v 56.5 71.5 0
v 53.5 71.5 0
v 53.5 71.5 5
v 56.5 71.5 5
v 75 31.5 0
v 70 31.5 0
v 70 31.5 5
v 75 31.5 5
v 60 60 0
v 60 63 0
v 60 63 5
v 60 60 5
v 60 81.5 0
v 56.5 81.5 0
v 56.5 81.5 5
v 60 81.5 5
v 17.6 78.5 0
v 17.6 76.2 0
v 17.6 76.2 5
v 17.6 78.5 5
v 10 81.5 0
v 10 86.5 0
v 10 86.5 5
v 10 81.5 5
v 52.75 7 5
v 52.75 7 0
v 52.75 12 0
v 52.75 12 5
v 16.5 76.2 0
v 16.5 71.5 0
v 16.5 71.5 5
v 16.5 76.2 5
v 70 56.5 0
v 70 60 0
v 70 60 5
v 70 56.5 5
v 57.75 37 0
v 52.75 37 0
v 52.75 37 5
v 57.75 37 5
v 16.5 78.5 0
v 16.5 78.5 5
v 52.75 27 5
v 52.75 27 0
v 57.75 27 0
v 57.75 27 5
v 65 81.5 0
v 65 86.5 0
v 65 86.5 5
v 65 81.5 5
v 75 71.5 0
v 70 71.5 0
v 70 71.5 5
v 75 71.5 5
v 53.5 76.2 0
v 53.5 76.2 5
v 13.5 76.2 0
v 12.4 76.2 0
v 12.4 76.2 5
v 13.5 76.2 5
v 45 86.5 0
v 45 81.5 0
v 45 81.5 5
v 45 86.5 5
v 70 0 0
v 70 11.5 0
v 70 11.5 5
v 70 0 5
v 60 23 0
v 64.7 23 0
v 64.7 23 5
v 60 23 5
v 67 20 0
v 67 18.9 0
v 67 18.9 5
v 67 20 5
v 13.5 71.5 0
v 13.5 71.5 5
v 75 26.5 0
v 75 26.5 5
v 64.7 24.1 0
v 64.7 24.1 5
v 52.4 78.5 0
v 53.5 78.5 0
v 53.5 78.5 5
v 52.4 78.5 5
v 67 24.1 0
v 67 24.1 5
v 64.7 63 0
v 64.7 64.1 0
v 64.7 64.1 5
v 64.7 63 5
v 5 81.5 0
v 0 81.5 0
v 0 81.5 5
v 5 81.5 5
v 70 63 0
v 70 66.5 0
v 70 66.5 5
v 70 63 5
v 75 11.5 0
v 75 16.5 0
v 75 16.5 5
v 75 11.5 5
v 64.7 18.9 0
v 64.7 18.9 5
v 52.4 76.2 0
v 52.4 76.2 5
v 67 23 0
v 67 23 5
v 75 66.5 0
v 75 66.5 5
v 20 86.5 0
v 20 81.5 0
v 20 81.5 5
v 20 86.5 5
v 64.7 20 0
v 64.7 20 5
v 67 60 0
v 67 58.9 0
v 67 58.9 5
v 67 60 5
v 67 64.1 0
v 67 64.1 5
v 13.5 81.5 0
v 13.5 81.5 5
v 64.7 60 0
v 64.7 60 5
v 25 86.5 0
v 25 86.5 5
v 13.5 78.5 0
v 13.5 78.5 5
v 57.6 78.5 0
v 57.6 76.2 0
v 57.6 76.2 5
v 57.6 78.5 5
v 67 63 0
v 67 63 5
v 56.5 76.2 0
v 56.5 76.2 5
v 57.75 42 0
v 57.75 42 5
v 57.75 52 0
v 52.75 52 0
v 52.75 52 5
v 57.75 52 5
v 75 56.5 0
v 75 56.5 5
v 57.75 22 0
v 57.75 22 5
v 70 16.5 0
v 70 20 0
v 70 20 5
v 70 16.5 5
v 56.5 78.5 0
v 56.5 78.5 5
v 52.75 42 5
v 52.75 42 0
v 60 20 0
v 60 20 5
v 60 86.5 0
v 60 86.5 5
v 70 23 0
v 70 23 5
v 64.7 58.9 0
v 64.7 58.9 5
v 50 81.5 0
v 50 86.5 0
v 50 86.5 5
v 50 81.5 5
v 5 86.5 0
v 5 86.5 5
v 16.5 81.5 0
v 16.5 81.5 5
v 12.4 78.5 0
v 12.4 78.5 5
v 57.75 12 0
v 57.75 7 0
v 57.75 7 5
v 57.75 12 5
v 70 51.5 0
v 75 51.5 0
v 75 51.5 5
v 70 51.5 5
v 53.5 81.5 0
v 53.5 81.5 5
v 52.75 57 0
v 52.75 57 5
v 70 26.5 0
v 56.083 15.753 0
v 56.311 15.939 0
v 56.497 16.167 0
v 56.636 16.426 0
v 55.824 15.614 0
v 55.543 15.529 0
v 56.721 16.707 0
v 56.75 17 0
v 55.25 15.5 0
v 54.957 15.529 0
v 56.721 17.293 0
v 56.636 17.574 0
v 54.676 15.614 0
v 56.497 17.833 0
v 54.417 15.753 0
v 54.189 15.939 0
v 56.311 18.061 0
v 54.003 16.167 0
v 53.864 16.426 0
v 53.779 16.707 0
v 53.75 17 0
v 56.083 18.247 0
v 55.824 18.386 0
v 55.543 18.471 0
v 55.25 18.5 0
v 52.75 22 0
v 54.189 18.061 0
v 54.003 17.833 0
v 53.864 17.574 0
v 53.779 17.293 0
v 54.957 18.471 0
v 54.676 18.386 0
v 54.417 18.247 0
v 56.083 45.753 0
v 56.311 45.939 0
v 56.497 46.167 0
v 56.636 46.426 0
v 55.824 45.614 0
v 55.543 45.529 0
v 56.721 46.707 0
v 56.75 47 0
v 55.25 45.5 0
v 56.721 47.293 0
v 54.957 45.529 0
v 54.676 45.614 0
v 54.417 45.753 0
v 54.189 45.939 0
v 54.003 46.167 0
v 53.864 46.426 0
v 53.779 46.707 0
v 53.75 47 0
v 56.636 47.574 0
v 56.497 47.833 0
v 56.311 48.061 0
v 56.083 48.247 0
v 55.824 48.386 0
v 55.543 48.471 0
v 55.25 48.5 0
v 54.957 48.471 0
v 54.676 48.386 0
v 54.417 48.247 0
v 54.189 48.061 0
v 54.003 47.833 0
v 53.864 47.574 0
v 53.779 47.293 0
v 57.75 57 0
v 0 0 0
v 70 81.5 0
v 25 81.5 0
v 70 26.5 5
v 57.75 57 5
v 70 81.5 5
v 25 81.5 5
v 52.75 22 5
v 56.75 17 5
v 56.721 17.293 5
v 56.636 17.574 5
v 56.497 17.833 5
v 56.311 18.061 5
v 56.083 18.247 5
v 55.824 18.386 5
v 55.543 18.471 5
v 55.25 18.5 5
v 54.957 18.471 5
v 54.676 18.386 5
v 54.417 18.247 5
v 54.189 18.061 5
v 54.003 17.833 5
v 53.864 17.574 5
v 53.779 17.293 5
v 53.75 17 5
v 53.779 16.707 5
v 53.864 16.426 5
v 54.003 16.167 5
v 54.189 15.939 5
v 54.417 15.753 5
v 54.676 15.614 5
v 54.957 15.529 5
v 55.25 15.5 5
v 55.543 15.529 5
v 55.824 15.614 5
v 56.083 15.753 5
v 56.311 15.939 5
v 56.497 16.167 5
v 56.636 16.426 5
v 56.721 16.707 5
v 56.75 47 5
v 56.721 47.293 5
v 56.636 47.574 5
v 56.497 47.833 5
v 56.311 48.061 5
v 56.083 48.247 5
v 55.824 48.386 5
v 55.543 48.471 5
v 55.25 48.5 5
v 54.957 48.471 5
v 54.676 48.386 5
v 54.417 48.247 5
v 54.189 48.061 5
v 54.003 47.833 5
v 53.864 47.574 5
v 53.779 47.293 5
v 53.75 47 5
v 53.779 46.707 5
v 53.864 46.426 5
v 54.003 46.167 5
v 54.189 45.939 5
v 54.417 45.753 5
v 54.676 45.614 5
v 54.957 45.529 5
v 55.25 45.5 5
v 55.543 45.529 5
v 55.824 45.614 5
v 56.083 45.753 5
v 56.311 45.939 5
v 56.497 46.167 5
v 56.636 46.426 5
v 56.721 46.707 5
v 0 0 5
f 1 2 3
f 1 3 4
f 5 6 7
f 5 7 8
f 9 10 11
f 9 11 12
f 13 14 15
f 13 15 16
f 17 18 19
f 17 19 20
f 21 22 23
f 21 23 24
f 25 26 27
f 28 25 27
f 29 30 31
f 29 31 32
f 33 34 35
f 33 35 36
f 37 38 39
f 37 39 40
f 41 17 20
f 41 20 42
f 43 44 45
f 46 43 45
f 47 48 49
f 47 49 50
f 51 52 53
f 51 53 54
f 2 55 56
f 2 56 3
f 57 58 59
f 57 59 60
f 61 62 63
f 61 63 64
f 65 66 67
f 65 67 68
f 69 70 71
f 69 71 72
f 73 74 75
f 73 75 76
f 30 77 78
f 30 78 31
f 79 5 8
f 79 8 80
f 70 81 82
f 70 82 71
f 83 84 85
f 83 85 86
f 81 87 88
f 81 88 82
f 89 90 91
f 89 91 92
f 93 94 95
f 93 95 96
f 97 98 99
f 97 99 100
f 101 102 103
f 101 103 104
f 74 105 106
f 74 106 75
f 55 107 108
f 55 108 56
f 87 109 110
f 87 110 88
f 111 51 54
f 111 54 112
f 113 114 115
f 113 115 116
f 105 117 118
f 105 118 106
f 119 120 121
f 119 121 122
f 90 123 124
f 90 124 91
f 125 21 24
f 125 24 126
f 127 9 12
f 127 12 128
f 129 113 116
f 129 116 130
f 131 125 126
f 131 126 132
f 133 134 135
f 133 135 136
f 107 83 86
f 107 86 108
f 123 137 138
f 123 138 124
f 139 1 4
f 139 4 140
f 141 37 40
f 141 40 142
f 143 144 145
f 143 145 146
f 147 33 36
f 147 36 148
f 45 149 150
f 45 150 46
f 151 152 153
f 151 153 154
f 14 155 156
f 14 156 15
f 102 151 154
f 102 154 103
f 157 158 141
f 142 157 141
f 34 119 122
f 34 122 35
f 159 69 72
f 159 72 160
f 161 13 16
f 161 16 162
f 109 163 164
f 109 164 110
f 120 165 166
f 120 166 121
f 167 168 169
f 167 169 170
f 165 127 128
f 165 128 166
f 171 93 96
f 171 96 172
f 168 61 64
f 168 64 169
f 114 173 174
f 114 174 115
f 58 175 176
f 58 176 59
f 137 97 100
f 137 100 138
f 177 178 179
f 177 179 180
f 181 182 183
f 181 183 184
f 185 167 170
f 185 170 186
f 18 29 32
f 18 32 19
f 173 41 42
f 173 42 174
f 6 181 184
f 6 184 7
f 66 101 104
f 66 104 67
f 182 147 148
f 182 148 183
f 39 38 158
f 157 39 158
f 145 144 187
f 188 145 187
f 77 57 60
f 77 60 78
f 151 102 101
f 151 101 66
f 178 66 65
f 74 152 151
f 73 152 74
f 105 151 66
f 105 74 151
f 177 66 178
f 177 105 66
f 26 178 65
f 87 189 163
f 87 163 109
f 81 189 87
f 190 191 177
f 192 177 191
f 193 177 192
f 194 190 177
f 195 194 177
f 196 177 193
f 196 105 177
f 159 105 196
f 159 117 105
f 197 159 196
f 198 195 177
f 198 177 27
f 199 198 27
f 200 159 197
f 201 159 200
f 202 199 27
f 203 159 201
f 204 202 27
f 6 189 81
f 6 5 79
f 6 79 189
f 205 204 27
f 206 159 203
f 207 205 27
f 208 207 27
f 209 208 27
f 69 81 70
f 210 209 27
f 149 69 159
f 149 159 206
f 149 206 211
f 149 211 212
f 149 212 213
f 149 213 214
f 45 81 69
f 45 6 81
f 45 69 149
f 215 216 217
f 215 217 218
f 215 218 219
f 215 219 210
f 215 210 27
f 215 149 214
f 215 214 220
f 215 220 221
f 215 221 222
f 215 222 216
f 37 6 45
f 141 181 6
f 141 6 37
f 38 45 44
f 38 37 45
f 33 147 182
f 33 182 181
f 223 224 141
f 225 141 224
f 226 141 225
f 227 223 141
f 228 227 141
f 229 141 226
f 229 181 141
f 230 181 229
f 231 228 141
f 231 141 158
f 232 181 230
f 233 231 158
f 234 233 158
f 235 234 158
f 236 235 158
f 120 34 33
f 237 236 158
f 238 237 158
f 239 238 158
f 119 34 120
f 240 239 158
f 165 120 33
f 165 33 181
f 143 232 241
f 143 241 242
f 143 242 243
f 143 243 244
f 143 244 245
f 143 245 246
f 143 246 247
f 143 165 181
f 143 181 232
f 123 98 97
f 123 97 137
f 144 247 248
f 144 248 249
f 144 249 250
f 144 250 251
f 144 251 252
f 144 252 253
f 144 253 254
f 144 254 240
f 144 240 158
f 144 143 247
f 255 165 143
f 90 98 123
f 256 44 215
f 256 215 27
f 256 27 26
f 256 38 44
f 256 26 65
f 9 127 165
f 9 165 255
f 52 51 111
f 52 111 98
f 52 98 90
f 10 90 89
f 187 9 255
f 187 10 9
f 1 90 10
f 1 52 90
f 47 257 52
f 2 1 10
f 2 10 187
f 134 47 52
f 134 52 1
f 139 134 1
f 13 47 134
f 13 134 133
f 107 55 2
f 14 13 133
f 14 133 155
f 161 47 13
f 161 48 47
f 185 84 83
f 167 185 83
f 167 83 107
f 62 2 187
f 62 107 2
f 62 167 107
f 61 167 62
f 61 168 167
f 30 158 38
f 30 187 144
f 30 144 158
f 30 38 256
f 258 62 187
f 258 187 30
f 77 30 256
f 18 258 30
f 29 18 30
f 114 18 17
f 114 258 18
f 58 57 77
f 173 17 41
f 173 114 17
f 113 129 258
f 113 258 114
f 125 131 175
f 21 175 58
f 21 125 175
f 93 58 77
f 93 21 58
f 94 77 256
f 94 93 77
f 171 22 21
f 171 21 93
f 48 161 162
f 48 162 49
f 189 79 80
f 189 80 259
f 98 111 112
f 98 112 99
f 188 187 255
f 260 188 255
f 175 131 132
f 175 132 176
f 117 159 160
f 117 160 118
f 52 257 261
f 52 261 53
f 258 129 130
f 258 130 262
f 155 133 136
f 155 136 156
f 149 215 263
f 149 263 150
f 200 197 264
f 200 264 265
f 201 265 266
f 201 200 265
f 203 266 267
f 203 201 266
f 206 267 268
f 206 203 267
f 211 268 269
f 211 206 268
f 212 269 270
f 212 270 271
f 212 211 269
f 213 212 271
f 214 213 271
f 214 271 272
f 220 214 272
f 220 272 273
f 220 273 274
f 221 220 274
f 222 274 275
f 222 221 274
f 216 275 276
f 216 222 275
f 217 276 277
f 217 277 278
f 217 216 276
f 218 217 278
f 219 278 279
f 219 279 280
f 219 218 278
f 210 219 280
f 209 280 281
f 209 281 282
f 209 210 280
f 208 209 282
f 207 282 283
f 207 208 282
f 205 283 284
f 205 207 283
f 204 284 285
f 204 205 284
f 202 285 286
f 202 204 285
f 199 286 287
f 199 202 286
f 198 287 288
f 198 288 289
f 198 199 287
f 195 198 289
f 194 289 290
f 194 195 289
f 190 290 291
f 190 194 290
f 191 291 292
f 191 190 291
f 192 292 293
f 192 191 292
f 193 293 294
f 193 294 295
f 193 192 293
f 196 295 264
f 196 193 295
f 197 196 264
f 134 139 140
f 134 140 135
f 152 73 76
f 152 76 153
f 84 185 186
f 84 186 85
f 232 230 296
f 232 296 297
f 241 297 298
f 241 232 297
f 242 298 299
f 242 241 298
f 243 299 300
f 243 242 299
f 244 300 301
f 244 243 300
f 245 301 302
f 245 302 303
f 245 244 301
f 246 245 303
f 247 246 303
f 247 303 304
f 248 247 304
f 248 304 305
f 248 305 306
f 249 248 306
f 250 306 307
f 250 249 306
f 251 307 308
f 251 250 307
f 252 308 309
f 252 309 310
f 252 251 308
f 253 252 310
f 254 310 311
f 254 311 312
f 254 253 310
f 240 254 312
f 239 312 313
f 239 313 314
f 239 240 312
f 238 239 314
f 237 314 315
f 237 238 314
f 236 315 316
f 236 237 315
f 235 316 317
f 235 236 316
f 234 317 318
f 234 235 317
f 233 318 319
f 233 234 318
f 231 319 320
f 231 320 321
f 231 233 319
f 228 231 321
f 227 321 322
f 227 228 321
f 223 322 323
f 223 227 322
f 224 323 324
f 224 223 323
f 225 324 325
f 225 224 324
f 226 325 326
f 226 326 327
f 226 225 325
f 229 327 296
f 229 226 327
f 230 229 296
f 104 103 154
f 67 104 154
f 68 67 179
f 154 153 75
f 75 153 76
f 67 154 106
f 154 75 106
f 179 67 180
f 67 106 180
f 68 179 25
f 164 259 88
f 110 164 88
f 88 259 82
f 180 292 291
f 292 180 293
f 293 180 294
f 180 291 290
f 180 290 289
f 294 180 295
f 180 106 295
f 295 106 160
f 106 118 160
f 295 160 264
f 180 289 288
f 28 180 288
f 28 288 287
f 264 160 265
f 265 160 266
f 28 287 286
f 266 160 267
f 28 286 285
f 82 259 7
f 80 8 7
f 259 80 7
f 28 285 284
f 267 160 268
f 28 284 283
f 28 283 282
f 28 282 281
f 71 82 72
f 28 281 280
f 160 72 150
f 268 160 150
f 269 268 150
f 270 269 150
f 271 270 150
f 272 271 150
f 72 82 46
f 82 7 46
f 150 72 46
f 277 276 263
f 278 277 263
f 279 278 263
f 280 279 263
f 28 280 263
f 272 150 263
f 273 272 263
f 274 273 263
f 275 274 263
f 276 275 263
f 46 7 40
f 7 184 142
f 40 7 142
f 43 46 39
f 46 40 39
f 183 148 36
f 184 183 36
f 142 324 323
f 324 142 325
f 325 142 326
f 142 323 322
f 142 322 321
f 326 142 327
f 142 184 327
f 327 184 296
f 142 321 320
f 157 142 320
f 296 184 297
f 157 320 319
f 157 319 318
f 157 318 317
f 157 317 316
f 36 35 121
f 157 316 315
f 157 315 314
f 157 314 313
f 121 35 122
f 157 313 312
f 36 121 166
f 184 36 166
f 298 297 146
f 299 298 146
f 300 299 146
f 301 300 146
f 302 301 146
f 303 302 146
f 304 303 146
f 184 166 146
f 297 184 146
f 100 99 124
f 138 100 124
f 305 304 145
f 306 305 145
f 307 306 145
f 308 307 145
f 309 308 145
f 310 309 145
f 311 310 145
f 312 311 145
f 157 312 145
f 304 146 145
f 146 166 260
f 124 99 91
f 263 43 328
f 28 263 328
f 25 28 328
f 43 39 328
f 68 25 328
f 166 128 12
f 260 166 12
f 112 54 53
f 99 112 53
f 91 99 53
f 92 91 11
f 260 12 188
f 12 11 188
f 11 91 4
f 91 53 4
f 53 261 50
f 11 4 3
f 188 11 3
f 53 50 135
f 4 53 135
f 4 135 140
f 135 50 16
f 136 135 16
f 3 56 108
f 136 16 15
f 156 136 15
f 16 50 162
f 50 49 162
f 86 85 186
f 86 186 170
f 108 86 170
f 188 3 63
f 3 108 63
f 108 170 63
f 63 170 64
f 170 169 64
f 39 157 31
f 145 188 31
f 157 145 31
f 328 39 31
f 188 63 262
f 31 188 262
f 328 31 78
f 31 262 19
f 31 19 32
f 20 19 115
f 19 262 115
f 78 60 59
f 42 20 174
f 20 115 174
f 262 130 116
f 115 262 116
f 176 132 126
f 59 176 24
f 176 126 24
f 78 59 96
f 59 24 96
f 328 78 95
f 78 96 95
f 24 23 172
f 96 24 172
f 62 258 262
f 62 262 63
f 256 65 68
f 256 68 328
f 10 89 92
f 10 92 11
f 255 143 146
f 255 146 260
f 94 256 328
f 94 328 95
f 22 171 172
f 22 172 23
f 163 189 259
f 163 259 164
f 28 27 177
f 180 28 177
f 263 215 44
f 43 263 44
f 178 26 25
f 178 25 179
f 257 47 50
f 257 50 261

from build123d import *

# Parameters (mm, degrees)
SKETCH1_R           = 1.5
SKETCH1_W           = 5
SKETCH1_H           = 5
BOSS_EXTRUDE1_DEPTH = 5


with BuildPart() as part:
    # Sketch1 → Boss-Extrude1 (new body)
    with BuildSketch(Plane.XY):
        Polygon((70, 81.5), (70, 71.5), (75, 71.5), (75, 66.5), (70, 66.5), (70, 63), (67, 63), (67, 64.1), (64.7, 64.1), (64.7, 63), (60, 63), (60, 60), (64.7, 60), (64.7, 58.9), (67, 58.9), (67, 60), (70, 60), (70, 56.5), (75, 56.5), (75, 51.5), (70, 51.5), (70, 31.5), (75, 31.5), (75, 26.5), (70, 26.5), (70, 23), (67, 23), (67, 24.1), (64.7, 24.1), (64.7, 23), (60, 23), (60, 20), (64.7, 20), (64.7, 18.9), (67, 18.9), (67, 20), (70, 20), (70, 16.5), (75, 16.5), (75, 11.5), (70, 11.5), (70, 0), (0, 0), (0, 81.5), (5, 81.5), (5, 86.5), (10, 86.5), (10, 81.5), (13.5, 81.5), (13.5, 78.5), (12.4, 78.5), (12.4, 76.2), (13.5, 76.2), (13.5, 71.5), (16.5, 71.5), (16.5, 76.2), (17.6, 76.2), (17.6, 78.5), (16.5, 78.5), (16.5, 81.5), (20, 81.5), (20, 86.5), (25, 86.5), (25, 81.5), (45, 81.5), (45, 86.5), (50, 86.5), (50, 81.5), (53.5, 81.5), (53.5, 78.5), (52.4, 78.5), (52.4, 76.2), (53.5, 76.2), (53.5, 71.5), (56.5, 71.5), (56.5, 76.2), (57.6, 76.2), (57.6, 78.5), (56.5, 78.5), (56.5, 81.5), (60, 81.5), (60, 86.5), (65, 86.5), (65, 81.5), align=None)
        with Locations((55.25, 47)):
            Circle(SKETCH1_R, mode=Mode.SUBTRACT)
        with Locations((55.25, 17)):
            Circle(SKETCH1_R, mode=Mode.SUBTRACT)
        with Locations((55.25, 39.5)):
            Rectangle(SKETCH1_W, SKETCH1_H, mode=Mode.SUBTRACT)
        with Locations((55.25, 54.5)):
            Rectangle(SKETCH1_W, SKETCH1_H, mode=Mode.SUBTRACT)
        with Locations((55.25, 9.5)):
            Rectangle(SKETCH1_W, SKETCH1_H, mode=Mode.SUBTRACT)
        with Locations((55.25, 24.5)):
            Rectangle(SKETCH1_W, SKETCH1_H, mode=Mode.SUBTRACT)
    extrude(amount=BOSS_EXTRUDE1_DEPTH)


solid = part.part
